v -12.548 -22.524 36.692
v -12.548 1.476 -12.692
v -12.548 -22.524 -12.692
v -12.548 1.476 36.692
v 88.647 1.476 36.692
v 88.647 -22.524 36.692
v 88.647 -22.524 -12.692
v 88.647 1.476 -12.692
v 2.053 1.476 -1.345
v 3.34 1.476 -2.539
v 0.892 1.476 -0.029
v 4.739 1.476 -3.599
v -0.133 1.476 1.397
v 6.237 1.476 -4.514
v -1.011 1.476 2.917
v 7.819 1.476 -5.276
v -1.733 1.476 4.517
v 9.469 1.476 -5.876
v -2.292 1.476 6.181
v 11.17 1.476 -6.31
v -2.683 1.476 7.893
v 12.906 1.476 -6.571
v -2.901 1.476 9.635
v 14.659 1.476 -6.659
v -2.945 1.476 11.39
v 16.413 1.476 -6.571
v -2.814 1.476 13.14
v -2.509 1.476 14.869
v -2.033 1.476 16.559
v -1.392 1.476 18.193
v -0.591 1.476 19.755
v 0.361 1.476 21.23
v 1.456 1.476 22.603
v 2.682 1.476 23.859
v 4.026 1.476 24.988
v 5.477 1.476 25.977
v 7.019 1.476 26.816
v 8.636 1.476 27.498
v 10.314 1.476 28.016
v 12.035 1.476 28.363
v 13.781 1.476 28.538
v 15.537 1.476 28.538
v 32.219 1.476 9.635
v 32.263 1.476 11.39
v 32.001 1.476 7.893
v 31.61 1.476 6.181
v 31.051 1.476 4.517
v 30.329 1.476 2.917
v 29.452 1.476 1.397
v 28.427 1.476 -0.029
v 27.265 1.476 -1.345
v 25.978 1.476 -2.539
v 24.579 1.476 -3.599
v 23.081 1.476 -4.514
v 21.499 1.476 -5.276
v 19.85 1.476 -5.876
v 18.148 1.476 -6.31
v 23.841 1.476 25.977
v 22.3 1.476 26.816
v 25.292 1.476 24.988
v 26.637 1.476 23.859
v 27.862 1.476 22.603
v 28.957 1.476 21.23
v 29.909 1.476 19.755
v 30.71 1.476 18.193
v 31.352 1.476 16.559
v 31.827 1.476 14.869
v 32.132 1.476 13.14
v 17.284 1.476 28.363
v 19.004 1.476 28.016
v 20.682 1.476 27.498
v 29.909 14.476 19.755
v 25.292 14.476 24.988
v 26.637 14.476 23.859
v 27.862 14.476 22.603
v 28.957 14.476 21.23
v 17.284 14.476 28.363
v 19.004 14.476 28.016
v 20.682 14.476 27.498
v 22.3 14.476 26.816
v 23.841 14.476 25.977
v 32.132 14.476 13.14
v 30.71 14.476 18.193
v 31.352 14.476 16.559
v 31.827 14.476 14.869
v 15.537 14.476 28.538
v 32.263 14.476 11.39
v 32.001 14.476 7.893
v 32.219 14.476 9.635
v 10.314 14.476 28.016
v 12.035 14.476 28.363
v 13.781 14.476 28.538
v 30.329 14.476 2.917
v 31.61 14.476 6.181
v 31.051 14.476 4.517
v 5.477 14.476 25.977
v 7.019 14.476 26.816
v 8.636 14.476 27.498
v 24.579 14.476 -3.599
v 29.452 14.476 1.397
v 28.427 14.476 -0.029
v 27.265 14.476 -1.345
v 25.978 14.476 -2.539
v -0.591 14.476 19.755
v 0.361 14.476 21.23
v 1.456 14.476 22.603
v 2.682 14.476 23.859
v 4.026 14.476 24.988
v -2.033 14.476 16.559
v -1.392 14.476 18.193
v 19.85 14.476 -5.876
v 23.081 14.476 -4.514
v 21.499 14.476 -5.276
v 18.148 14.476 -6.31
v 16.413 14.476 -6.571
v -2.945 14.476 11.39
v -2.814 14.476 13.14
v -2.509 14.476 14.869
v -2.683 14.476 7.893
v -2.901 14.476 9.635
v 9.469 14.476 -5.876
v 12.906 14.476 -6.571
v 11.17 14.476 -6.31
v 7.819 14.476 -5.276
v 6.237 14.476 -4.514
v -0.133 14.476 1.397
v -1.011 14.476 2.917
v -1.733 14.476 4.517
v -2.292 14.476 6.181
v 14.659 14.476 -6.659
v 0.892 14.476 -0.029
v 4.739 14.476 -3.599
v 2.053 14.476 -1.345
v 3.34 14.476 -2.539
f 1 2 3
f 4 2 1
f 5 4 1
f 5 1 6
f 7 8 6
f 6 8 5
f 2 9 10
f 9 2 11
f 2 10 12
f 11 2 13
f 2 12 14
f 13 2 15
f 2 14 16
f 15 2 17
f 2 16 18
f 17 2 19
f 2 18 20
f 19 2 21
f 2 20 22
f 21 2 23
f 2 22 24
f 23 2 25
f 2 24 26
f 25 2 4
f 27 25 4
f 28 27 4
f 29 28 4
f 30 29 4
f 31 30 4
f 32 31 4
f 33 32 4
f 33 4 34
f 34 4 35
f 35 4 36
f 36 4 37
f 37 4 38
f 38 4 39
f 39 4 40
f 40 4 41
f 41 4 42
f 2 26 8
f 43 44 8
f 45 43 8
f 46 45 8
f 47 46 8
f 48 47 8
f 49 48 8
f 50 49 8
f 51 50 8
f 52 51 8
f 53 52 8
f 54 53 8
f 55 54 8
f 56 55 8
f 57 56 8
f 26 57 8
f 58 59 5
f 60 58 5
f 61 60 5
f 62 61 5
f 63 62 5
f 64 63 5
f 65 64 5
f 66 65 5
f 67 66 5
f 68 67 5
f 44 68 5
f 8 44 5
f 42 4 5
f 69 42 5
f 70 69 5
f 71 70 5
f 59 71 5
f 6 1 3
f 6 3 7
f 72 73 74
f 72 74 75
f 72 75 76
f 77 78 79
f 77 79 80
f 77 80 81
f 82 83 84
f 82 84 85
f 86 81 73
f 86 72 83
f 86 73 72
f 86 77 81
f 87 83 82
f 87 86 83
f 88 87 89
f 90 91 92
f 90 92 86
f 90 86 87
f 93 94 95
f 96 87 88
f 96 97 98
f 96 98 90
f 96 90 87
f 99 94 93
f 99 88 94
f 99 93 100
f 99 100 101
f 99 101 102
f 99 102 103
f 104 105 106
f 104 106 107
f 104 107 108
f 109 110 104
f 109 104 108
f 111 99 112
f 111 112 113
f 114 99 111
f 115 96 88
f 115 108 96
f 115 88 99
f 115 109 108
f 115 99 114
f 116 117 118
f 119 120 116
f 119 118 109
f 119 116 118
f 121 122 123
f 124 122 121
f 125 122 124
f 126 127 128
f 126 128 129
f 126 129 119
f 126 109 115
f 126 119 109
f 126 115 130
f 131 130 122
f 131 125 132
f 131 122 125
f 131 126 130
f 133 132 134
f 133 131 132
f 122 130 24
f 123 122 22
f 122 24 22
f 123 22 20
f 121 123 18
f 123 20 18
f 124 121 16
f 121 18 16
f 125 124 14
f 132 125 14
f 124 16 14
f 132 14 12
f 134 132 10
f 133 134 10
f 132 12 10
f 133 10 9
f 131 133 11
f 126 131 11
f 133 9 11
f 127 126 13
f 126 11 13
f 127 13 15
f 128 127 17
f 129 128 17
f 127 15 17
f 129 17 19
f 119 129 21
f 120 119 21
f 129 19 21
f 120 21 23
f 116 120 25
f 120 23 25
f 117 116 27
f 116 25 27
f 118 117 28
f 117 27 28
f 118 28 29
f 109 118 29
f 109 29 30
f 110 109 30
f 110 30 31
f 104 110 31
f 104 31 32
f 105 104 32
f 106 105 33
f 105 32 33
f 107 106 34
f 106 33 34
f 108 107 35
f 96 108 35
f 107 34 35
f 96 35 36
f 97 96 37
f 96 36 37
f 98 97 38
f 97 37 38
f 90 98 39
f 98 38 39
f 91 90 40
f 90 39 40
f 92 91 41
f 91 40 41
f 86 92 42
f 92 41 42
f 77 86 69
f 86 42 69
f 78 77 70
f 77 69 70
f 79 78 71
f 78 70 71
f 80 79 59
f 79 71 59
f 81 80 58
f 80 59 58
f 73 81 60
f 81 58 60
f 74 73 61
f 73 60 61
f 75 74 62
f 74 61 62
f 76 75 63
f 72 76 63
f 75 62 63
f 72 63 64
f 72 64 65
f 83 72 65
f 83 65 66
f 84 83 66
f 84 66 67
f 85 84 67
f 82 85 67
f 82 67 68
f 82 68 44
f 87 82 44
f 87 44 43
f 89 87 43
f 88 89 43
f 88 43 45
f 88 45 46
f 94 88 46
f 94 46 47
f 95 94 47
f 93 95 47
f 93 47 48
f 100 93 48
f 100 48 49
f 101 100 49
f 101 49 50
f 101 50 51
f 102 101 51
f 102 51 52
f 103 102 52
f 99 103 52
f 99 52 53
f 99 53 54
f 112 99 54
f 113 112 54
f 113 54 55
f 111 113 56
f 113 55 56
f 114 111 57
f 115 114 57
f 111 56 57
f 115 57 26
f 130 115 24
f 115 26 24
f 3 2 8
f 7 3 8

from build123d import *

# Parameters (mm, degrees)
IZIM1_W                     = 101.194983934
IZIM1_H                     = 49.38315216
Y_KSEKLIK_EKSTR_ZYON2_DEPTH = 24
G_VDE_TA_KOPYALA1_ANGLE     = 90
IZIM2_R                     = 17.60947899
Y_KSEKLIK_EKSTR_ZYON4_DEPTH = 13


with BuildPart() as part:
    # Çizim1 → Yükseklik-Ekstrüzyon2 (new body)
    with BuildSketch(Plane.XY):
        with Locations((38.049313959, -10.524278329)):
            Rectangle(IZIM1_W, IZIM1_H)
    extrude(amount=Y_KSEKLIK_EKSTR_ZYON2_DEPTH)


with BuildPart() as part_1:
    # Gövde-Taşı/Kopyala1: moved
    add(part.part.rotate(Axis((0, -10.524278329, 12), (1, 0, 0)), G_VDE_TA_KOPYALA1_ANGLE))

    # Çizim2 → Yükseklik-Ekstrüzyon4 (add)
    with BuildSketch(Plane(origin=(0, 1.475721671, 0), x_dir=(1, 0, 0), z_dir=(0, 1, 0))):
        with Locations(Location((14.659162211, -10.95067627, 0), (0, 0, 90))):
            Circle(IZIM2_R)
    extrude(amount=Y_KSEKLIK_EKSTR_ZYON4_DEPTH)


solid = part_1.part
